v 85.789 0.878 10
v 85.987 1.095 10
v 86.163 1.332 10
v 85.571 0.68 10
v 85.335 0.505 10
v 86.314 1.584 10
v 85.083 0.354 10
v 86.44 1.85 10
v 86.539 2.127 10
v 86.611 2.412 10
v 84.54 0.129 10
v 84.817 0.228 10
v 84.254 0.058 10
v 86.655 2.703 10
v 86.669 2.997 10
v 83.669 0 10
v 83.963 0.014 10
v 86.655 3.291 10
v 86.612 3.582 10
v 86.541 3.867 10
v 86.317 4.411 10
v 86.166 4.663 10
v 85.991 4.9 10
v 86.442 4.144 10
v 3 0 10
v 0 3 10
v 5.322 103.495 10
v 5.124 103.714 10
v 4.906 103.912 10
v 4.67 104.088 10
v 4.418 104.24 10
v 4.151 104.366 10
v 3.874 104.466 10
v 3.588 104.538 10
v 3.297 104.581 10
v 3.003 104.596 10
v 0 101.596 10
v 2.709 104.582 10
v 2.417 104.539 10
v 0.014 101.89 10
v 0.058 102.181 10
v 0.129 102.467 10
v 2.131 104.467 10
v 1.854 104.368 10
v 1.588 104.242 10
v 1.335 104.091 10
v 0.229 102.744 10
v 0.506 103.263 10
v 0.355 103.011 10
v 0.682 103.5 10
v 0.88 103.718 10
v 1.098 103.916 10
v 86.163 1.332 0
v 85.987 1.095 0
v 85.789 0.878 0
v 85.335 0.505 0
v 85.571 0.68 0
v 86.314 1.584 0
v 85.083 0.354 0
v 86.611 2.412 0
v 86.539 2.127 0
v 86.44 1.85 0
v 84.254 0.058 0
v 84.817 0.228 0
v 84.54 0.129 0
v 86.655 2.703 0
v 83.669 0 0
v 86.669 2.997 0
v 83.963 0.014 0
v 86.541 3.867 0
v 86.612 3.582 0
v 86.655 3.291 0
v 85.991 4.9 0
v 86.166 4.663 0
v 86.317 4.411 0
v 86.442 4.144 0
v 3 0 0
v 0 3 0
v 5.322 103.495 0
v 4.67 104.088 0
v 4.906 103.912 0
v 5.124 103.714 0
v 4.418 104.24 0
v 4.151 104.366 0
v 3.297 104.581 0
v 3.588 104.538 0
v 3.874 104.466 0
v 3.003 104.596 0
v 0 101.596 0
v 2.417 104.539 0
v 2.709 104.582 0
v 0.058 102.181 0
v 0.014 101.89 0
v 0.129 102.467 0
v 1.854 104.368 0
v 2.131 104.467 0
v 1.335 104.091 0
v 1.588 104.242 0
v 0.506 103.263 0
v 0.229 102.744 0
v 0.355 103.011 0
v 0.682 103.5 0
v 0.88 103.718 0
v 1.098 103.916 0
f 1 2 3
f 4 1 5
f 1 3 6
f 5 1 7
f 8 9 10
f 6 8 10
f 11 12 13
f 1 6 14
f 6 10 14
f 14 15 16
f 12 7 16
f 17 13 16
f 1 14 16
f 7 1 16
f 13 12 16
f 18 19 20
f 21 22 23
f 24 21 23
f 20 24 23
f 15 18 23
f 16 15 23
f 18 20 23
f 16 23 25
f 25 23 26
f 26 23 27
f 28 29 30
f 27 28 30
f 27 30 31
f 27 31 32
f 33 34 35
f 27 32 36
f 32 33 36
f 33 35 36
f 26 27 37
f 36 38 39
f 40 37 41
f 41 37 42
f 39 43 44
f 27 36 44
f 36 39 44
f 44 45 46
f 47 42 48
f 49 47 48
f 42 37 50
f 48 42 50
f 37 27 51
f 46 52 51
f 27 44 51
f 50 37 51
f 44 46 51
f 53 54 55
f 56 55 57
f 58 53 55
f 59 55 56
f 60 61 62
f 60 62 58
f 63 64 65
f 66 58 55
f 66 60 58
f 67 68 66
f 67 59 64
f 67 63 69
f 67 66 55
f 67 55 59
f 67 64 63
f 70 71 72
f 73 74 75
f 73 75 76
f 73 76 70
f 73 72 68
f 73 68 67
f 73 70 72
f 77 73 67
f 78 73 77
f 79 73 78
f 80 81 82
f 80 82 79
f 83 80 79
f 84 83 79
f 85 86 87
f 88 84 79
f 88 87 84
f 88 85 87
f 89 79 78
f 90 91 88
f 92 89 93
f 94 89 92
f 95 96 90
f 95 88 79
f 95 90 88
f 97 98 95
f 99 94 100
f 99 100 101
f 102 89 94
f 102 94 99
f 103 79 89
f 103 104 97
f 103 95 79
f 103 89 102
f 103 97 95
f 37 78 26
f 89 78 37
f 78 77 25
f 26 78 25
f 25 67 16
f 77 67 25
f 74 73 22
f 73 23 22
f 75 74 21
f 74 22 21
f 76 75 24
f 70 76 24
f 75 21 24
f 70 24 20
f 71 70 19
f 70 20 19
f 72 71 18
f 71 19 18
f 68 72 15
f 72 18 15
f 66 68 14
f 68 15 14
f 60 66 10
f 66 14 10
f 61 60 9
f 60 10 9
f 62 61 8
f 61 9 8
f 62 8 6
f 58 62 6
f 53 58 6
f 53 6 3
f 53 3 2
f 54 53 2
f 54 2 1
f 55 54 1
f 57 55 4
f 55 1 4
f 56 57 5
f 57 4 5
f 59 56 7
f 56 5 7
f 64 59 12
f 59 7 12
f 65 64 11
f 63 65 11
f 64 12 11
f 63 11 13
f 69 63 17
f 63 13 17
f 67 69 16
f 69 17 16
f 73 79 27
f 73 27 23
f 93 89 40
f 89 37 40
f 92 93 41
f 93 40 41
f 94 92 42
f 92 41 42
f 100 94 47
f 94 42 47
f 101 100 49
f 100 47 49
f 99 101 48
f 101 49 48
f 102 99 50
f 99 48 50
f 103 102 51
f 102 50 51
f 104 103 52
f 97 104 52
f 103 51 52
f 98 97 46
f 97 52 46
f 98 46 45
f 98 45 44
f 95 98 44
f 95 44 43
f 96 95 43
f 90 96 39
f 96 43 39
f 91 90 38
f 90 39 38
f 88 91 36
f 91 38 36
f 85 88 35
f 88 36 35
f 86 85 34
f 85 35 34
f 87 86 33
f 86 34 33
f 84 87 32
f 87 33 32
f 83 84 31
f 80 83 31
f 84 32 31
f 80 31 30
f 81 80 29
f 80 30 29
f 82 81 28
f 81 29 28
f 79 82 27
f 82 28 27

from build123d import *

# Parameters (mm, degrees)
Y_KSEKLIK_EKSTR_ZYON1_DEPTH = 10
PAH1_SIZE                   = 3
RADYUS1_R                   = 3


with BuildPart() as part:
    # Çizim1 → Yükseklik-Ekstrüzyon1 (new body)
    with BuildSketch(Plane.XY):
        Polygon((0, 0), (0, 110), (90, 0), align=None)
    extrude(amount=Y_KSEKLIK_EKSTR_ZYON1_DEPTH)

    # Pah1
    pah1_edges = [part.edges().sort_by_distance(p)[0] for p in [
        (0, 0, 5),
    ]]
    chamfer(pah1_edges, length=PAH1_SIZE)

    # Radyus1
    radyus1_edges = [part.edges().sort_by_distance(p)[0] for p in [
        (0, 110, 5),
        (90, 0, 5),
    ]]
    fillet(radyus1_edges, radius=RADYUS1_R)


solid = part.part
